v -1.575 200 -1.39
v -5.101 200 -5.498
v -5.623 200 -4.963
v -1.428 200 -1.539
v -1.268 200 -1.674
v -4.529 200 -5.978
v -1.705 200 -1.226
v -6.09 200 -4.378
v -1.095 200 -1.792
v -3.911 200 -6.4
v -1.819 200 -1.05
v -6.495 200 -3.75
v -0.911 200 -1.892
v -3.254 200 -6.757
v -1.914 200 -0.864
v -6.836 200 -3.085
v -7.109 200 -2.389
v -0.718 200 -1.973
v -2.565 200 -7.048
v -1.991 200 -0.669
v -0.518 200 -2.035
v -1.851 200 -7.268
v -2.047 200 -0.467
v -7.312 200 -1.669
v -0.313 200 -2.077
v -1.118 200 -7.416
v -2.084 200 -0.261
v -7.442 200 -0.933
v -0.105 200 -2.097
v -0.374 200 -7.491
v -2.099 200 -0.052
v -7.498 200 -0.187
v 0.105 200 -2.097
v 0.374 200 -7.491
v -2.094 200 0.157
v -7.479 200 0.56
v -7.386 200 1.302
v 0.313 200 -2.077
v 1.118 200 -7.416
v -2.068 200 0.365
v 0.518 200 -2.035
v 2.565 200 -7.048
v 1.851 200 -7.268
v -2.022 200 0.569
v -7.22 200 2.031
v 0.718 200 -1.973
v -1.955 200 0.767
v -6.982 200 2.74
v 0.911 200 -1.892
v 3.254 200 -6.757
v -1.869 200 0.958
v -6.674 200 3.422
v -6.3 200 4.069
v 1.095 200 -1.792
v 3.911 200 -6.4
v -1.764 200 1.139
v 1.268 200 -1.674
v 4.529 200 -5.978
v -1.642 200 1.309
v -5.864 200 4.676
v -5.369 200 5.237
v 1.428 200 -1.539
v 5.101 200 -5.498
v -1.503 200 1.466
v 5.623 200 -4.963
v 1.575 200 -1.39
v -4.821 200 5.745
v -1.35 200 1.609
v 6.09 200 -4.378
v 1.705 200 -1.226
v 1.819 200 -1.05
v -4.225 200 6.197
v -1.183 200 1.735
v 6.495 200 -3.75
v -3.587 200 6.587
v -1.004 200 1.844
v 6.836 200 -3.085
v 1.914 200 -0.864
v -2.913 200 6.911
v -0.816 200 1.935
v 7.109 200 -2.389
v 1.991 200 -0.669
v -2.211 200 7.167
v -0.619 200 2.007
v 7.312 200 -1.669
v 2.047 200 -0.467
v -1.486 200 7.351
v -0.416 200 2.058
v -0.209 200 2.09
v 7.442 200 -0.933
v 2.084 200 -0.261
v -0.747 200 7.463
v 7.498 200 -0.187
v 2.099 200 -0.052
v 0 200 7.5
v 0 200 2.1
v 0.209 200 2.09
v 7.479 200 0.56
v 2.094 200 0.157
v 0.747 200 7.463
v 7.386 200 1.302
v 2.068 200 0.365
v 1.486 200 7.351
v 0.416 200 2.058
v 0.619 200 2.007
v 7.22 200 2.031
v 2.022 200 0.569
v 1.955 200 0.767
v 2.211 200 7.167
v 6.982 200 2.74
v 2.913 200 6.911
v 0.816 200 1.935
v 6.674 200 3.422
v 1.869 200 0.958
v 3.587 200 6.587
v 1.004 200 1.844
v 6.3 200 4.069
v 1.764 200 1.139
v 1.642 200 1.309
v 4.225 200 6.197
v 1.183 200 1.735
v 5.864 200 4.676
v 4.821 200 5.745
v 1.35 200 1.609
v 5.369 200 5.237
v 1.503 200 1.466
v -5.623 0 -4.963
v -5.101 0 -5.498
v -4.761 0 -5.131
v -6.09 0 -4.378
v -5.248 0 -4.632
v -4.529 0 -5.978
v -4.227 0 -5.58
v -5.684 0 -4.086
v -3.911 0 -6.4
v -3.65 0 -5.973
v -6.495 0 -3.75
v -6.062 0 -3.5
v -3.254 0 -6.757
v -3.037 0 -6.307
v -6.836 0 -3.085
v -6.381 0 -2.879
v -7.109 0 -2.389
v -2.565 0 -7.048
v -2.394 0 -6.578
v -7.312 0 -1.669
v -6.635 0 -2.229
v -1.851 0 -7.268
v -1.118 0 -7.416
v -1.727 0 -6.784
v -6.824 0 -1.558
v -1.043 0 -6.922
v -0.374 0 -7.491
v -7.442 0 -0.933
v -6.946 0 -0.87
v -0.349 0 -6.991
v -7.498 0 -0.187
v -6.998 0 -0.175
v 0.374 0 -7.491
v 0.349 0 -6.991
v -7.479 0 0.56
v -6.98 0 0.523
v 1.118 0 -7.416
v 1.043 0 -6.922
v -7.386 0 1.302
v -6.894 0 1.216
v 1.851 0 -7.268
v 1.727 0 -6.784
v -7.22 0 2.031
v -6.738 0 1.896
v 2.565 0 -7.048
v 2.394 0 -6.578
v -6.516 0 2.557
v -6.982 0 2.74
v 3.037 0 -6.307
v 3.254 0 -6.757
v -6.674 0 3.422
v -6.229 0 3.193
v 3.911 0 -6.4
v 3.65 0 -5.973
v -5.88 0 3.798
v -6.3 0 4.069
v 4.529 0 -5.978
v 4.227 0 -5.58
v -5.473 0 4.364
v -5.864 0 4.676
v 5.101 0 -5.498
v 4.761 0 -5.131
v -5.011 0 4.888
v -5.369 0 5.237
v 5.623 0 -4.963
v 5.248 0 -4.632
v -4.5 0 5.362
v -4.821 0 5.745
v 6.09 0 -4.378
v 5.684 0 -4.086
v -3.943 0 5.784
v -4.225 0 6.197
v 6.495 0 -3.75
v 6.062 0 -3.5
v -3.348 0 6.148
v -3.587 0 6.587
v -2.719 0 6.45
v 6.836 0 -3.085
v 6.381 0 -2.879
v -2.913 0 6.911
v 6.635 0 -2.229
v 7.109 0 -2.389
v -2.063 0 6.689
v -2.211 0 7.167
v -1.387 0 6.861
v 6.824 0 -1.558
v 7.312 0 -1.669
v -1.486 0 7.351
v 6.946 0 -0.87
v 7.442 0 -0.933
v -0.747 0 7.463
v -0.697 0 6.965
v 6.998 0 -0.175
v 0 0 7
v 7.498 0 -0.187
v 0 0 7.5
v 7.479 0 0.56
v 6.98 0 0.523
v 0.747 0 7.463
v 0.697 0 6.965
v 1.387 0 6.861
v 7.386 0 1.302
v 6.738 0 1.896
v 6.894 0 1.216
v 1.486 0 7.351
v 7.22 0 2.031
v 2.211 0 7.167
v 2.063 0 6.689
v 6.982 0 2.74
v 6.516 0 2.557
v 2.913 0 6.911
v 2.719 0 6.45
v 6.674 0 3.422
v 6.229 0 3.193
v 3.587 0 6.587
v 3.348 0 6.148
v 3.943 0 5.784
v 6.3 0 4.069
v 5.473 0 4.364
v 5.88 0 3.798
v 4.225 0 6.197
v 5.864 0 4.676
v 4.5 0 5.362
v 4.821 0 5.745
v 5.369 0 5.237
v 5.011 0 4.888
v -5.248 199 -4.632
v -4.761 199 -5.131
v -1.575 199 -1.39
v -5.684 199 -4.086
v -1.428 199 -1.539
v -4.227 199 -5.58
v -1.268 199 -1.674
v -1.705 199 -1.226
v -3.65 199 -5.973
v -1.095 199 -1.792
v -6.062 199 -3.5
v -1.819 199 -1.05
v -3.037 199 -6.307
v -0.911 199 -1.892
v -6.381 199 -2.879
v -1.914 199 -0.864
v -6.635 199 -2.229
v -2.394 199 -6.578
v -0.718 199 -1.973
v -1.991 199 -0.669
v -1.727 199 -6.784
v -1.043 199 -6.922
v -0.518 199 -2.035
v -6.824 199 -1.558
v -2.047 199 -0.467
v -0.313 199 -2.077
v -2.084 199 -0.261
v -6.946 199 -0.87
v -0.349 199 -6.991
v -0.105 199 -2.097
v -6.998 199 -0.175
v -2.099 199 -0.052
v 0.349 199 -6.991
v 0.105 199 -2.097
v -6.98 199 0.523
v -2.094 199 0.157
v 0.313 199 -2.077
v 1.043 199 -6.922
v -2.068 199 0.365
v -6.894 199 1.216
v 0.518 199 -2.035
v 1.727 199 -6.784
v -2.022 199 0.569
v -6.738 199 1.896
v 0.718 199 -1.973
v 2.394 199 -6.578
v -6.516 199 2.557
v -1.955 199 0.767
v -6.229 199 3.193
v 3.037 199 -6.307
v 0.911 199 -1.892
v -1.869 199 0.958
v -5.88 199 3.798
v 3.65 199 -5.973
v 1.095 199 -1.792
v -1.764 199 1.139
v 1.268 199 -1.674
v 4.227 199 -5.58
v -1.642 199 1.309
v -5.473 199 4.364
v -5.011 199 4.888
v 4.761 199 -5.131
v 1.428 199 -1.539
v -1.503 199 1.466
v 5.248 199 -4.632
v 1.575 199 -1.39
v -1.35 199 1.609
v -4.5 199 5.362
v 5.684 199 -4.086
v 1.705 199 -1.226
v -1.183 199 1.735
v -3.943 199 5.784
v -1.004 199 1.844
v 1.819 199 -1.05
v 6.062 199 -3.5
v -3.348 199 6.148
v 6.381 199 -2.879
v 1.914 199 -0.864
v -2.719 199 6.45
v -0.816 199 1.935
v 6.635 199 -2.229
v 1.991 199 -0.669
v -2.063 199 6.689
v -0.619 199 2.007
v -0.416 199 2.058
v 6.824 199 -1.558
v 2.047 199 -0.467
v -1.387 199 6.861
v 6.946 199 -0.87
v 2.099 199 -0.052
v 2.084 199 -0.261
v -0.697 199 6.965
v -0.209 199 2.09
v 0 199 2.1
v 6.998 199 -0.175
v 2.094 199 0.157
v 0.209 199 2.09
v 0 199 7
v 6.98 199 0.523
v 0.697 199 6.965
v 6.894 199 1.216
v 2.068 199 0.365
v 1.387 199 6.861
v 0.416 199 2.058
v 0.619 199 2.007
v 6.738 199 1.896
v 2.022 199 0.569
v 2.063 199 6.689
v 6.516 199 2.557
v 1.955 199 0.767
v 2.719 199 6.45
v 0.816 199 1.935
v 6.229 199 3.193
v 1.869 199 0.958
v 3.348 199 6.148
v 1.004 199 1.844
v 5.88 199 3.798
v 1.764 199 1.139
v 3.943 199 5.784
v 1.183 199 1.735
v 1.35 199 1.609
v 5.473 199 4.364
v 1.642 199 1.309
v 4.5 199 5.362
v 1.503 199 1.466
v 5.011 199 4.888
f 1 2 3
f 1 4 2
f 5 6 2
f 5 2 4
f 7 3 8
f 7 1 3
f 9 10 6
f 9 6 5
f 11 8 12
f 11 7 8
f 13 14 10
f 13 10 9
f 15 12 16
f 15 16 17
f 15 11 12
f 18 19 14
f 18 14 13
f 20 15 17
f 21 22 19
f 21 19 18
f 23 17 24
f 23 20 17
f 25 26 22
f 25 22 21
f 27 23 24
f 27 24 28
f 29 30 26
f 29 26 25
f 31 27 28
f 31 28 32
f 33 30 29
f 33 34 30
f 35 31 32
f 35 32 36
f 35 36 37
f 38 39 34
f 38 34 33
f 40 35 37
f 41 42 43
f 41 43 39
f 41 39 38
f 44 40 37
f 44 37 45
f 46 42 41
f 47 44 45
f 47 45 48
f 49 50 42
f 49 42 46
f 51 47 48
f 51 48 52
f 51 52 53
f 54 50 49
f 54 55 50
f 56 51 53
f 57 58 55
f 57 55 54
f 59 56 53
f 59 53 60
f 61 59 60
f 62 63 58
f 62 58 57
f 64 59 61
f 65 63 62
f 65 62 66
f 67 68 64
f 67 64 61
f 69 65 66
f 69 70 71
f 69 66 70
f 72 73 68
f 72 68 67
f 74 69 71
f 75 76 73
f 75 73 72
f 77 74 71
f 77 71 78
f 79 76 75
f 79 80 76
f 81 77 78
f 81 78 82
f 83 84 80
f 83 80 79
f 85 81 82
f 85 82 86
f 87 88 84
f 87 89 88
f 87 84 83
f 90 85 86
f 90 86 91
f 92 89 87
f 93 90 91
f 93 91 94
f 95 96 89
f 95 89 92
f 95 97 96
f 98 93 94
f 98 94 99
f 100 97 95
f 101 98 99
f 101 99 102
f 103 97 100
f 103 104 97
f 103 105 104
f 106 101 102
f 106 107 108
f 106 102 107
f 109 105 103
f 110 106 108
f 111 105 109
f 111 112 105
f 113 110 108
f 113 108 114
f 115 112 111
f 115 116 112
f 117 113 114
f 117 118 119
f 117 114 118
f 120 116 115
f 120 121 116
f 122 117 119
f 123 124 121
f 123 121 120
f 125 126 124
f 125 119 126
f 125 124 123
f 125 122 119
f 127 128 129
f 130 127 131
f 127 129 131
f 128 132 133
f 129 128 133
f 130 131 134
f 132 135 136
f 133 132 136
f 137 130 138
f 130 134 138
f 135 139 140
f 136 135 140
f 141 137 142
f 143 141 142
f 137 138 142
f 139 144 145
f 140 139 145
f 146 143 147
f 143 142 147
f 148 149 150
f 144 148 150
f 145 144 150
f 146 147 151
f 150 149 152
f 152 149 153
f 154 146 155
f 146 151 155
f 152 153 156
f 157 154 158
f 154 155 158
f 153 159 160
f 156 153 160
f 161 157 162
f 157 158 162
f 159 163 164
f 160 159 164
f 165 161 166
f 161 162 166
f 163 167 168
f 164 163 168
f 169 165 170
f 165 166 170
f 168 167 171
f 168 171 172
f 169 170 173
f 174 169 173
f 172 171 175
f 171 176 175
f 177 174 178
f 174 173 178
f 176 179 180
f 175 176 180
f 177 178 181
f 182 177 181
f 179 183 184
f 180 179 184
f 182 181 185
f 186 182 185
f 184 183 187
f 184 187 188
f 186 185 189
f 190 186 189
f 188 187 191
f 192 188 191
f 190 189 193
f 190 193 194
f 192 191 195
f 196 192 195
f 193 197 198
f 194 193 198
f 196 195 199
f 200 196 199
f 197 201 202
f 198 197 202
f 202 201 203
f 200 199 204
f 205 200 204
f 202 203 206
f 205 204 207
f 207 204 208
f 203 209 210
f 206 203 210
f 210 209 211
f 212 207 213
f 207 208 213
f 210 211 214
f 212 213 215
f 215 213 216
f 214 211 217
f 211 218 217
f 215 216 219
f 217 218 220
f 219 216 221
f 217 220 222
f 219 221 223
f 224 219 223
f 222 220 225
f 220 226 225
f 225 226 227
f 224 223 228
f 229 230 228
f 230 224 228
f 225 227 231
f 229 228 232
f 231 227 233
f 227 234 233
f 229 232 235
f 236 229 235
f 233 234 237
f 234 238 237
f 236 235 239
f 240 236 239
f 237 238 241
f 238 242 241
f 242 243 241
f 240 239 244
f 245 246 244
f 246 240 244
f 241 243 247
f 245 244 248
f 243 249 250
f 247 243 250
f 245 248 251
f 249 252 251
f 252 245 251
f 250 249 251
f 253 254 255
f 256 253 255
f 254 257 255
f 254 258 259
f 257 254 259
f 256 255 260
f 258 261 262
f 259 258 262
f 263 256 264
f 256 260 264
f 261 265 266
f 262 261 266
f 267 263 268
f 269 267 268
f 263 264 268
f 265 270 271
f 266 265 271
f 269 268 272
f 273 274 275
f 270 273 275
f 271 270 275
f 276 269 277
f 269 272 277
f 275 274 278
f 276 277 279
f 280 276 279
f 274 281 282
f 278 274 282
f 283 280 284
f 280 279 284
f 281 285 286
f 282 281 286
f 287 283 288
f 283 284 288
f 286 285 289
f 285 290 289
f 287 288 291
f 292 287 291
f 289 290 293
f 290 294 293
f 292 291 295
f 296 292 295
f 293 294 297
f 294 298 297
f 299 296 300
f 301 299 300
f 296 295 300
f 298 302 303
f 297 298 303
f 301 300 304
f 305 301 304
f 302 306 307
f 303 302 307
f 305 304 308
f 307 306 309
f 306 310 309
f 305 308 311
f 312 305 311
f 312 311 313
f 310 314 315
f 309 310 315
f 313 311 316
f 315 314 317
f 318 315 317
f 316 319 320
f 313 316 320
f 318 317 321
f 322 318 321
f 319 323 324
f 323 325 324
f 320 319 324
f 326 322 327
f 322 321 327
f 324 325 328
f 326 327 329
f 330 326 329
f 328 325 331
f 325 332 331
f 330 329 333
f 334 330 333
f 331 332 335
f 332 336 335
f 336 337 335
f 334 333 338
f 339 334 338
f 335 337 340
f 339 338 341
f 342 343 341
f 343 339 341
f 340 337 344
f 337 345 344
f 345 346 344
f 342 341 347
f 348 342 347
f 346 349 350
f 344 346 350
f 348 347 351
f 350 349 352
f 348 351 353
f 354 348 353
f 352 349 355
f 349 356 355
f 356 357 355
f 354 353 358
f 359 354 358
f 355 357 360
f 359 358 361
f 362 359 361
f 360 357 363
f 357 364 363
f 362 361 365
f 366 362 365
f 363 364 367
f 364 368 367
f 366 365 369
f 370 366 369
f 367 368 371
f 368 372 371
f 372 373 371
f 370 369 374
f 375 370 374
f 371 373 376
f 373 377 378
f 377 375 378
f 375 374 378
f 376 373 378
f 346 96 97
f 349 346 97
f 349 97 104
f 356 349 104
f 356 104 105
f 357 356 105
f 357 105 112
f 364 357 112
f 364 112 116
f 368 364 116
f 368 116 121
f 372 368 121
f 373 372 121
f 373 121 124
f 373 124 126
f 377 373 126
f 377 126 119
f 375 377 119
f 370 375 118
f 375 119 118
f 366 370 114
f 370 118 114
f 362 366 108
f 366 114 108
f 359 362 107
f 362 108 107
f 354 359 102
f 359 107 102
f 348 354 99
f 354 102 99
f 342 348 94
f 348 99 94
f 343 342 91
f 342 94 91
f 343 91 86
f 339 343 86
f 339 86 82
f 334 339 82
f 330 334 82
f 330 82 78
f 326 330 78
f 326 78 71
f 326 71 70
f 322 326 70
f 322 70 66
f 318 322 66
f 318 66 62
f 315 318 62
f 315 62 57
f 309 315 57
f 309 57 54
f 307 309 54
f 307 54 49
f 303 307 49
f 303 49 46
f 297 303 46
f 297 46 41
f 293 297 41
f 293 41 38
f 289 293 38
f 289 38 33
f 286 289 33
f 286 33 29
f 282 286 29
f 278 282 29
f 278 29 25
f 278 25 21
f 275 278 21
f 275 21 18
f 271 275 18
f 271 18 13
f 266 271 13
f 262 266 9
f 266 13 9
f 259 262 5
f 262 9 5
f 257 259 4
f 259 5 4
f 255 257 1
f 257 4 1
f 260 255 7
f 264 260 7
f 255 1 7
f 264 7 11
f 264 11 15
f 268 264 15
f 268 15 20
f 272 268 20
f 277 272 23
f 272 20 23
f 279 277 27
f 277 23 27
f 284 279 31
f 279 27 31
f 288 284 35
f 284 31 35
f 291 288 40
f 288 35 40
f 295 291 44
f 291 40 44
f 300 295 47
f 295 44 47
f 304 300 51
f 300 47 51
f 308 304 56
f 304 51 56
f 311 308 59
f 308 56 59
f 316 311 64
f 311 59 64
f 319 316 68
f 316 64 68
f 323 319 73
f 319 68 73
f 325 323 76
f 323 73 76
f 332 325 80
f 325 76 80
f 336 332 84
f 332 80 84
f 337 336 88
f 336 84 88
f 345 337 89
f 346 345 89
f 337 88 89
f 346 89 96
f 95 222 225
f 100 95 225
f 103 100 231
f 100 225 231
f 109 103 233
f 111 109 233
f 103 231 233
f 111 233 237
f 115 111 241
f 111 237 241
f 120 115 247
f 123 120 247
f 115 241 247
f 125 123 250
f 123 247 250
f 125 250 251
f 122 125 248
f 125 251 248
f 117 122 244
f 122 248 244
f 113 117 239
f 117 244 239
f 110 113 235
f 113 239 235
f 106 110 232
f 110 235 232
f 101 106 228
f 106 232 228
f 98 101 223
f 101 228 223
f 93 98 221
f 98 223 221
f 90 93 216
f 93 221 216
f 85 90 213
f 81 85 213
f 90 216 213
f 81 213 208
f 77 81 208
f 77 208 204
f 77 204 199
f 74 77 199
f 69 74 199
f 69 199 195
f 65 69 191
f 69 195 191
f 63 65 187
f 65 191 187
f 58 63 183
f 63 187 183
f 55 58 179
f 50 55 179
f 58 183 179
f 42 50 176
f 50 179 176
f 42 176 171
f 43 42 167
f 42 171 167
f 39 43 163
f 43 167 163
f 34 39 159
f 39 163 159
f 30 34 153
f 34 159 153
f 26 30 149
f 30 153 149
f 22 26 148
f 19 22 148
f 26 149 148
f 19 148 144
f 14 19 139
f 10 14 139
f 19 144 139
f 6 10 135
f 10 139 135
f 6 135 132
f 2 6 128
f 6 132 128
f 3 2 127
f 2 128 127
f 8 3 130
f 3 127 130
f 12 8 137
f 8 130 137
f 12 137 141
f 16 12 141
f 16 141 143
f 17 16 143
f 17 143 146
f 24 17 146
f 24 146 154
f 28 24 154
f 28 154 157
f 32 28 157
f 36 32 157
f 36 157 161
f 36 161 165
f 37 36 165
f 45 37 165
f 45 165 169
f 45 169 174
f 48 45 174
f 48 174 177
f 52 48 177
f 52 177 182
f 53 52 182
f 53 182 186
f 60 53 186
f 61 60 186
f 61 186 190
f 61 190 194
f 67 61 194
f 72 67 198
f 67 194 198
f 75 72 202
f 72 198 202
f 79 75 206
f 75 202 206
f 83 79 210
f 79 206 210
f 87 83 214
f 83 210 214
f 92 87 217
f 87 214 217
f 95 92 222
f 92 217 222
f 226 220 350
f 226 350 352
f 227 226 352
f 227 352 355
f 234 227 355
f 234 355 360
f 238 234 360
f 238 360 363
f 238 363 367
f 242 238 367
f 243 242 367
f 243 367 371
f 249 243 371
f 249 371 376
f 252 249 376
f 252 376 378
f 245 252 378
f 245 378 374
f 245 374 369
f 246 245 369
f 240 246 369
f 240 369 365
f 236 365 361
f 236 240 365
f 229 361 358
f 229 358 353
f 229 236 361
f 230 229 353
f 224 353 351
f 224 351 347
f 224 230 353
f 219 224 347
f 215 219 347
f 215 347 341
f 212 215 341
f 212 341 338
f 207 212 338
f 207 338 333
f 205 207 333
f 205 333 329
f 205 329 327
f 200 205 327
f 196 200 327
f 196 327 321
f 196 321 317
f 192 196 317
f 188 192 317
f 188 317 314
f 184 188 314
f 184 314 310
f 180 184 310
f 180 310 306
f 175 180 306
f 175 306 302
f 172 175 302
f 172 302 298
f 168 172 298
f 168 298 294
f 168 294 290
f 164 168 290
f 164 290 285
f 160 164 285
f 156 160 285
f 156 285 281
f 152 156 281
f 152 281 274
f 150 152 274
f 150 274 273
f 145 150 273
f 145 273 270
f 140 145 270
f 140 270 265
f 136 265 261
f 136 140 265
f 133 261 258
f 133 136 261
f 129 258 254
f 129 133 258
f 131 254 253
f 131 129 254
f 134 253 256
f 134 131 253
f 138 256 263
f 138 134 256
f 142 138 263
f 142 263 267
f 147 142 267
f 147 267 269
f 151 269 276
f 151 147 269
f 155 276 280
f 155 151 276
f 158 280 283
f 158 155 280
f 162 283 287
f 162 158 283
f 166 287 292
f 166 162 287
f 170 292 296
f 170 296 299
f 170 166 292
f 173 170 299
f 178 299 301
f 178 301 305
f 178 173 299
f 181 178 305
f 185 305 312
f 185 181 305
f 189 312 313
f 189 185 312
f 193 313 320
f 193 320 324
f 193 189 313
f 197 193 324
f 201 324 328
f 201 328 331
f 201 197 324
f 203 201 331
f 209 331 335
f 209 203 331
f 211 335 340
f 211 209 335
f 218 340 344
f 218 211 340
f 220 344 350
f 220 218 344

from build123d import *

# Parameters (mm, degrees)
SKETCH_1_R          = 7.5
SKETCH_1_R_2        = 7
EXTRUDE_1_DEPTH     = 200
EXTRUDE_START       = -1
SKETCH_2_R          = 7
EXTRUDE_2_DEPTH     = 1
SKETCH_3_R          = 2.1
CUT_EXTRUDE_1_DEPTH = 10


with BuildPart() as part:
    # 草图1 → 凸台-拉伸1 (new body)
    with BuildSketch(Plane(origin=(0, 0, 0), x_dir=(1, 0, 0), z_dir=(0, 1, 0))):
        with Locations(Location((0, 0, 0), (0, 0, 270))):
            Circle(SKETCH_1_R)
        with Locations(Location((0, 0, 0), (0, 0, 270))):
            Circle(SKETCH_1_R_2, mode=Mode.SUBTRACT)
    extrude(amount=EXTRUDE_1_DEPTH)

    # 草图2 → 凸台-拉伸2 (add)
    with BuildSketch(Plane(origin=(0, 200, 0), x_dir=(1, 0, 0), z_dir=(0, 1, 0)).offset(EXTRUDE_START)):
        with Locations(Location((0, 0, 0), (0, 0, 270))):
            Circle(SKETCH_2_R)
    extrude(amount=EXTRUDE_2_DEPTH)

    # 草图3 → 切除-拉伸1 (cut)
    with BuildSketch(Plane(origin=(0, 200, 0), x_dir=(1, 0, 0), z_dir=(0, 1, 0))):
        with Locations(Location((0, 0, 0), (0, 0, 270))):
            Circle(SKETCH_3_R)
    extrude(amount=-CUT_EXTRUDE_1_DEPTH, mode=Mode.SUBTRACT)


solid = part.part
